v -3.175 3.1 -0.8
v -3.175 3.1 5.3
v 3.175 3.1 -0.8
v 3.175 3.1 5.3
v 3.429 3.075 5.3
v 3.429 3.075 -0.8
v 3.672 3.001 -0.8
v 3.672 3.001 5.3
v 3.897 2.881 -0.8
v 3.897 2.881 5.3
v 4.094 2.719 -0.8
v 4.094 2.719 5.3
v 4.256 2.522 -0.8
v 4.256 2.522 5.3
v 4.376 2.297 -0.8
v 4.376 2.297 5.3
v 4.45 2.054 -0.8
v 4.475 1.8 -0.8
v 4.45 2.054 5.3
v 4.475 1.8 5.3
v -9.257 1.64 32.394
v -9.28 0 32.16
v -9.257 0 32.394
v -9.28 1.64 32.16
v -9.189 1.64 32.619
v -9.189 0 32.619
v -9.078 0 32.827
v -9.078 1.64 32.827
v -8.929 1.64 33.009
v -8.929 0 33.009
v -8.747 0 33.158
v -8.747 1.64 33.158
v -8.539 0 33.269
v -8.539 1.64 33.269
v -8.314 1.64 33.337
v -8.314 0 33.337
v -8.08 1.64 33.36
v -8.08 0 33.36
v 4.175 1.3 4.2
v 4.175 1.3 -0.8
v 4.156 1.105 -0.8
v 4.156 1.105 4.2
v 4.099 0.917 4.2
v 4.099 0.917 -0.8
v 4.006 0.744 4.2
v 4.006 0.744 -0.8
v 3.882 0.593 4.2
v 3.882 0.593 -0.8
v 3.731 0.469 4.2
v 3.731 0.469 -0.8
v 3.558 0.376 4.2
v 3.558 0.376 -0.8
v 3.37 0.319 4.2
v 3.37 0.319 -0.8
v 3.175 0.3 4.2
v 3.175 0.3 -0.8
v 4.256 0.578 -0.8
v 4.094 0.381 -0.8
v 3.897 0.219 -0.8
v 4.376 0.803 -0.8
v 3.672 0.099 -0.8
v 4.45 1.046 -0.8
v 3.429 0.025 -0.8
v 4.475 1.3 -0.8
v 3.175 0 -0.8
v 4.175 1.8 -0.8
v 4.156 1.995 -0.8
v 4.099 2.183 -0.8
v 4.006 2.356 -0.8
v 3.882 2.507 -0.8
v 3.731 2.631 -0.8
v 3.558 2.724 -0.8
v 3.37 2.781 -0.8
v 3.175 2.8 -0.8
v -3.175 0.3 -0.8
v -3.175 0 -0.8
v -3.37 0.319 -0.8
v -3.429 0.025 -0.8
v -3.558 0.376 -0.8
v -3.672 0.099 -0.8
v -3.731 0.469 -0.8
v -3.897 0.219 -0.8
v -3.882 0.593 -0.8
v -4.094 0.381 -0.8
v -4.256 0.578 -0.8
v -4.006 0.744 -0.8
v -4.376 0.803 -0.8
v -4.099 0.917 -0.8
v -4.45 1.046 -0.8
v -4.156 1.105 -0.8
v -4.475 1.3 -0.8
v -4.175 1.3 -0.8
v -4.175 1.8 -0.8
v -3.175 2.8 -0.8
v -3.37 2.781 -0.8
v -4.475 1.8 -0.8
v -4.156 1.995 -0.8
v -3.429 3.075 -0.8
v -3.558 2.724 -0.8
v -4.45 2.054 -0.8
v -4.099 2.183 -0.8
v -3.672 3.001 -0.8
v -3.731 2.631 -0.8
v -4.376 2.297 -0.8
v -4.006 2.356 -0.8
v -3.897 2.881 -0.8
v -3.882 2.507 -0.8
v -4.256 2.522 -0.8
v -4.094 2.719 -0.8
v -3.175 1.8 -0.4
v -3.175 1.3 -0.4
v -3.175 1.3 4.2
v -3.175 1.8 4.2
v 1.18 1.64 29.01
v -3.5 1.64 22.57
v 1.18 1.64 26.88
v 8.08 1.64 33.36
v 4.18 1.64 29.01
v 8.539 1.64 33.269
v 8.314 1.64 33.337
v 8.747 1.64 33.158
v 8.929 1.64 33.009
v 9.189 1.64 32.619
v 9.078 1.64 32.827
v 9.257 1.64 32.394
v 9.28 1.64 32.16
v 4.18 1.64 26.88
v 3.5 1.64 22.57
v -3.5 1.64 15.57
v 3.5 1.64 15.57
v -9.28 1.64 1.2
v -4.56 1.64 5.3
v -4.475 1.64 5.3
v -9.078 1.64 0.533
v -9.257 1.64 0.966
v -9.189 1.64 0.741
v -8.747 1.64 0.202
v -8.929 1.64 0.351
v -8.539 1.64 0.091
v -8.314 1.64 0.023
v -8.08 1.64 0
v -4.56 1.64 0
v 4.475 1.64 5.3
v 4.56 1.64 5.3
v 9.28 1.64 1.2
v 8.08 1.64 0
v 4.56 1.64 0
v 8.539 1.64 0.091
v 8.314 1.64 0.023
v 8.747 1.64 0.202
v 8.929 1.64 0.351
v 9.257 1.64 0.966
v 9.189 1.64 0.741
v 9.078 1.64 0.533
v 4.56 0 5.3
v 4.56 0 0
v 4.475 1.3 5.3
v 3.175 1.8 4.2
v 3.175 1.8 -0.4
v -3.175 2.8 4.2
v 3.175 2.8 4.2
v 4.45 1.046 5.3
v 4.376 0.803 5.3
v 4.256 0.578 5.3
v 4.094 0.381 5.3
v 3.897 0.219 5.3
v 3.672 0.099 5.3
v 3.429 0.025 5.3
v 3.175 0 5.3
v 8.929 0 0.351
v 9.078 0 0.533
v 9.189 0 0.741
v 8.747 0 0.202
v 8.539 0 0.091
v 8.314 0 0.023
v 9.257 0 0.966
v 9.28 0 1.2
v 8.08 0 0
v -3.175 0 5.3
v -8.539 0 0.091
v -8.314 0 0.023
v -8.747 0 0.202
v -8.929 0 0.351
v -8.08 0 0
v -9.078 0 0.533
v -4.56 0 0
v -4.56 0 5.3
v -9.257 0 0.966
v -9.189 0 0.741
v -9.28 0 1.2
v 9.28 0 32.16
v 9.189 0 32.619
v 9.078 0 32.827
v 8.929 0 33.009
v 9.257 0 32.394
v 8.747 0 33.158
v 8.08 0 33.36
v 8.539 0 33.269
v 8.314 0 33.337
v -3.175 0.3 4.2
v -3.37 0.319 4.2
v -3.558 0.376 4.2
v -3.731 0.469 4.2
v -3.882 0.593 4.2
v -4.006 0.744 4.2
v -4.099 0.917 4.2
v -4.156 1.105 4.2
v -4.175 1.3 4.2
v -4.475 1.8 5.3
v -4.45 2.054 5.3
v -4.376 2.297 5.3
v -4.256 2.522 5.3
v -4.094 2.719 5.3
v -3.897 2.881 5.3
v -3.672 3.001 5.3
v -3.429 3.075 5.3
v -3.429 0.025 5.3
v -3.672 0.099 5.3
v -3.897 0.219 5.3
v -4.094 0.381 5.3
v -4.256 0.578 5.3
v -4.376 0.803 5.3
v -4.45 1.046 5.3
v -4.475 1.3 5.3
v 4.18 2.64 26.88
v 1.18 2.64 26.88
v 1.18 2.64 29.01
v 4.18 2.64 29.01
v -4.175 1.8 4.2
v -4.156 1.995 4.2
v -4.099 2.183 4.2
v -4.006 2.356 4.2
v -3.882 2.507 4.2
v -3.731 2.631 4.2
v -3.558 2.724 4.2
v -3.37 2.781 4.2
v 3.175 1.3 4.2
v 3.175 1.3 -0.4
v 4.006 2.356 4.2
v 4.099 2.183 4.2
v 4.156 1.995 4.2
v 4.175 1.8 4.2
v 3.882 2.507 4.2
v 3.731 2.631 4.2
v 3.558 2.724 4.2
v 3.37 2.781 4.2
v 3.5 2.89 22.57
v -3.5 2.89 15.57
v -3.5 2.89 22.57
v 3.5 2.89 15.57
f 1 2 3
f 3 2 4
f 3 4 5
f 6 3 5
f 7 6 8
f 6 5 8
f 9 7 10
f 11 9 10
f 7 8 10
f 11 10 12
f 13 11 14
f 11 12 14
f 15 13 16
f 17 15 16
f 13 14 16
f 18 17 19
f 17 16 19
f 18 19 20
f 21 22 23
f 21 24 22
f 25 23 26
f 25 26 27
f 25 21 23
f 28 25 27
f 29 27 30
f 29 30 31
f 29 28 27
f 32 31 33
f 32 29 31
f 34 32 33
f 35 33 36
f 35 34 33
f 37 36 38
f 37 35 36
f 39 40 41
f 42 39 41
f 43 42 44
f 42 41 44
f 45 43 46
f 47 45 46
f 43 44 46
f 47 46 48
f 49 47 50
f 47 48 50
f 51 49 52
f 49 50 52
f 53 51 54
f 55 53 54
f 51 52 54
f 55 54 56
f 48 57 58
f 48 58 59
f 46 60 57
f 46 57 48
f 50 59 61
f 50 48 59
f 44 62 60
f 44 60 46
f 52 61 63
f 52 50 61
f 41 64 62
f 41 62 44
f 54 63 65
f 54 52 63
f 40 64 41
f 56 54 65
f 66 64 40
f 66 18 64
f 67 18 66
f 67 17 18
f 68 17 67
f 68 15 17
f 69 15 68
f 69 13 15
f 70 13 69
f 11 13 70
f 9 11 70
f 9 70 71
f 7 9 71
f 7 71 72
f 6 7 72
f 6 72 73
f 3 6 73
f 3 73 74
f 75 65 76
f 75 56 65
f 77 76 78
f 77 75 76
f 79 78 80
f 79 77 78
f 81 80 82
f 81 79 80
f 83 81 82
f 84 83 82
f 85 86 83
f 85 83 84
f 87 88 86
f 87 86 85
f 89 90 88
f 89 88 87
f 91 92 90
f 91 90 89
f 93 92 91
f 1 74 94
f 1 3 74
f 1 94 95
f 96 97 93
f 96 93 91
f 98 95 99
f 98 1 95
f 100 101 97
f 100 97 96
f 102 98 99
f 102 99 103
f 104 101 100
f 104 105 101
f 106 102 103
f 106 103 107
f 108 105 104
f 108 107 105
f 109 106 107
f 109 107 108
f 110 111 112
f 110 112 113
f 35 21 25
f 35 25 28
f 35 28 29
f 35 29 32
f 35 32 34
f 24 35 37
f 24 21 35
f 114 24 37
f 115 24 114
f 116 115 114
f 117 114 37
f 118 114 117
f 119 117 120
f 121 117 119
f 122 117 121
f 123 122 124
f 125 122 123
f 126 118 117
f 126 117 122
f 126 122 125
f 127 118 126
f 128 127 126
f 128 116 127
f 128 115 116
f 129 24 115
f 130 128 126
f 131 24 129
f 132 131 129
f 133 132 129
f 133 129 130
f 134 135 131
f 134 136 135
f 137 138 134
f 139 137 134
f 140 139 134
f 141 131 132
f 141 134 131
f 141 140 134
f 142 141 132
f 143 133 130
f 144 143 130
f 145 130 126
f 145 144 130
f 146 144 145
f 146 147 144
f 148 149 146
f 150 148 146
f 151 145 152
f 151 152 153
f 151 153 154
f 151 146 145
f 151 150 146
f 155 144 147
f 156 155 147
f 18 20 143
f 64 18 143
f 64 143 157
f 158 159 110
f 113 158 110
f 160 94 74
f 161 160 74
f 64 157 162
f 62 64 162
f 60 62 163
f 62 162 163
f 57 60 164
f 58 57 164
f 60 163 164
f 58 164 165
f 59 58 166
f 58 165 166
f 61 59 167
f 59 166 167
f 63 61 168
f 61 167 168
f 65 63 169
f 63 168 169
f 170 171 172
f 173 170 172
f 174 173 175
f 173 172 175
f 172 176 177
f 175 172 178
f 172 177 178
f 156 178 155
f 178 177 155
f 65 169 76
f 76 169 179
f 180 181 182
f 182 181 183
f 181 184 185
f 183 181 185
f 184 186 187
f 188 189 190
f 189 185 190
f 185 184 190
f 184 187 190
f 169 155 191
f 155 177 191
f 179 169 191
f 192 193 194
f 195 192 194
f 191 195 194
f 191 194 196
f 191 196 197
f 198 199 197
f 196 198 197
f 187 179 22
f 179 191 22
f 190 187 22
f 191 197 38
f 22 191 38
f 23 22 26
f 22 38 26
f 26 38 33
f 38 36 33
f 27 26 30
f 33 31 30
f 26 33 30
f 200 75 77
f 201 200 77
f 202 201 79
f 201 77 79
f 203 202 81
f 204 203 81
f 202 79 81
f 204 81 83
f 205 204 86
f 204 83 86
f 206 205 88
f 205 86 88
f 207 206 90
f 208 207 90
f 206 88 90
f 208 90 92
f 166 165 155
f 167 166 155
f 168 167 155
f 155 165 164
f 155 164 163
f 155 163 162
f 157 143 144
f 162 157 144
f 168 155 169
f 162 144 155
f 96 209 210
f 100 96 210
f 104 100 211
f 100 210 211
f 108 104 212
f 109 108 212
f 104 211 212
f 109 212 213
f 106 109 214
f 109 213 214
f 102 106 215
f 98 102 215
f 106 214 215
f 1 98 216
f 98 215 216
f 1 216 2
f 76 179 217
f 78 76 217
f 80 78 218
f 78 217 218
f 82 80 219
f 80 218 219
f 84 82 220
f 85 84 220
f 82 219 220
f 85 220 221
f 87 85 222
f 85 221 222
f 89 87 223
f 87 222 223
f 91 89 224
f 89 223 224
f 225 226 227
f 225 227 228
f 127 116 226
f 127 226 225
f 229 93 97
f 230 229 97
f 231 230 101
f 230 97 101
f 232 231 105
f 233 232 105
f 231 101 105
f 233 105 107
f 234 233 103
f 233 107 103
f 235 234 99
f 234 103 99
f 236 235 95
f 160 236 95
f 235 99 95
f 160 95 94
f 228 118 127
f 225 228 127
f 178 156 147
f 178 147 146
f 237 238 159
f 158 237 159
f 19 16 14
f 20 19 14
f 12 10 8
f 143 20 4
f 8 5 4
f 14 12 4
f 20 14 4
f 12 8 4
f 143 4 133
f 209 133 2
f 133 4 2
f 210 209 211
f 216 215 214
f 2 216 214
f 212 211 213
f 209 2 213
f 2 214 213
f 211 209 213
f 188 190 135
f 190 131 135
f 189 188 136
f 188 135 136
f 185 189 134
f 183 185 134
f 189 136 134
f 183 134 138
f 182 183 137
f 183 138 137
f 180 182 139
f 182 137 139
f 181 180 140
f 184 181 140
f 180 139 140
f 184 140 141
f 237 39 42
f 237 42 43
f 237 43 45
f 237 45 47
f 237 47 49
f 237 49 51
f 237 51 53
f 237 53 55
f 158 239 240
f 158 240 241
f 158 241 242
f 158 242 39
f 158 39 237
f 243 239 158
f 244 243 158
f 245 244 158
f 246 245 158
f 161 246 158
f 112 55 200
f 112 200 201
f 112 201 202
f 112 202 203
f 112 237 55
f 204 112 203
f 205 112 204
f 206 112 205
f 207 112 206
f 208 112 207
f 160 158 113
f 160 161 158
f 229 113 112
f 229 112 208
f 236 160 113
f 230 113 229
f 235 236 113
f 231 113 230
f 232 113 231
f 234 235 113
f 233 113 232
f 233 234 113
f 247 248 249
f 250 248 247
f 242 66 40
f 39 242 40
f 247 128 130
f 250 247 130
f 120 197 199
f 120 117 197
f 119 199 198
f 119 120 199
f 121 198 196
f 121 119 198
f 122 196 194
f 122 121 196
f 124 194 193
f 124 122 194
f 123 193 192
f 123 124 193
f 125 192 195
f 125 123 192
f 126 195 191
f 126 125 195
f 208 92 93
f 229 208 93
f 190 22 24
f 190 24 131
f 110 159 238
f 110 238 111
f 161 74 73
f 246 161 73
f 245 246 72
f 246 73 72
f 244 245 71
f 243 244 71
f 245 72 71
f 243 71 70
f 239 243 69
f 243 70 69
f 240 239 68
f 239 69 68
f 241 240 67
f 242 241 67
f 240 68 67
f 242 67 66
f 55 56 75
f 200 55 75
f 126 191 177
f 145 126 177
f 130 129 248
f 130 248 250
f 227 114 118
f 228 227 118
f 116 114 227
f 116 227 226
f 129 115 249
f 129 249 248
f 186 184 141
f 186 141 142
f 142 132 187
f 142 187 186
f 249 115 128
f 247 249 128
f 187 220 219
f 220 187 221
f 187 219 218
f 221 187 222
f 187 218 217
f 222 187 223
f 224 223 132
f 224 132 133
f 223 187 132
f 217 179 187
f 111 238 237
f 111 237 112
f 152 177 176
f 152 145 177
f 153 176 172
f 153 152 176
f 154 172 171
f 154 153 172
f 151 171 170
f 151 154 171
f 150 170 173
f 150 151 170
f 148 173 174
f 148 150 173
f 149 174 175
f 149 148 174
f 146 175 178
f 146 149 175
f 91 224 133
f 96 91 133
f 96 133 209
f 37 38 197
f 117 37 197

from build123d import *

# Parameters (mm, degrees)
SKETCH1_W           = 18.56
SKETCH1_H           = 33.36
BOSS_EXTRUDE1_DEPTH = 1.64
FILLET1_R           = 1.2
SKETCH2_W           = 9.12
SKETCH2_H           = 5.3
CUT_EXTRUDE1_DEPTH  = 35.665510237
BOSS_EXTRUDE2_DEPTH = 6.1
SKETCH4_W           = 6.35
SKETCH4_H           = 0.5
CUT_EXTRUDE2_DEPTH  = 5
SKETCH5_W           = 6.35
SKETCH5_H           = 0.5
CUT_EXTRUDE3_DEPTH  = 0.4
SKETCH7_W           = 7
SKETCH7_H           = 7
BOSS_EXTRUDE3_DEPTH = 1.25
SKETCH8_W           = 3
SKETCH8_H           = 2.13
BOSS_EXTRUDE4_DEPTH = 1


with BuildPart() as part:
    # Sketch1 → Boss-Extrude1 (new body)
    with BuildSketch(Plane(origin=(0, 0, 0), x_dir=(1, 0, 0), z_dir=(0, 1, 0))):
        with Locations((0, -16.68)):
            Rectangle(SKETCH1_W, SKETCH1_H)
    extrude(amount=BOSS_EXTRUDE1_DEPTH)

    # Fillet1
    fillet1_edges = [part.edges().sort_by_distance(p)[0] for p in [
        (-9.28, 0.82, 0),
        (9.28, 0.82, 0),
        (9.28, 0.82, 33.36),
        (-9.28, 0.82, 33.36),
    ]]
    fillet(fillet1_edges, radius=FILLET1_R)

    # Sketch2 → Cut-Extrude1 (cut, through all)
    with BuildSketch(Plane(origin=(0, 1.64, 0), x_dir=(1, 0, 0), z_dir=(0, 1, 0))):
        with Locations((0, -2.65)):
            Rectangle(SKETCH2_W, SKETCH2_H)
    extrude(amount=-CUT_EXTRUDE1_DEPTH, mode=Mode.SUBTRACT)

    # Sketch3 → Boss-Extrude2 (add)
    with BuildSketch(Plane(origin=(0, 0, 5.3), x_dir=(-1, 0, 0), z_dir=(0, 0, -1))):
        with BuildLine():
            Line((-3.175, 0), (3.175, 0))
            ThreePointArc((3.175, 0), (4.094238816, 0.380761184), (4.475, 1.3))
            Line((4.475, 1.3), (4.475, 1.8))
            ThreePointArc((4.475, 1.8), (4.094238816, 2.719238816), (3.175, 3.1))
            Line((3.175, 3.1), (-3.175, 3.1))
            ThreePointArc((-3.175, 3.1), (-4.094238816, 2.719238816), (-4.475, 1.8))
            Line((-4.475, 1.8), (-4.475, 1.3))
            ThreePointArc((-4.475, 1.3), (-4.094238816, 0.380761184), (-3.175, 0))
        make_face()
    extrude(amount=BOSS_EXTRUDE2_DEPTH)

    # Sketch4 → Cut-Extrude2 (cut)
    with BuildSketch(Plane(origin=(0, 0, -0.8), x_dir=(-1, 0, 0), z_dir=(0, 0, -1))):
        with BuildLine():
            Line((3.175, 2.8), (-3.175, 2.8))
            ThreePointArc((-3.175, 2.8), (-3.882106781, 2.507106781), (-4.175, 1.8))
            Line((-4.175, 1.8), (-4.175, 1.3))
            ThreePointArc((-4.175, 1.3), (-3.882106781, 0.592893219), (-3.175, 0.3))
            Line((-3.175, 0.3), (3.175, 0.3))
            ThreePointArc((3.175, 0.3), (3.882106781, 0.592893219), (4.175, 1.3))
            Line((4.175, 1.3), (4.175, 1.8))
            ThreePointArc((4.175, 1.8), (3.882106781, 2.507106781), (3.175, 2.8))
        make_face()
        with Locations((0, 1.55)):
            Rectangle(SKETCH4_W, SKETCH4_H, mode=Mode.SUBTRACT)
    extrude(amount=-CUT_EXTRUDE2_DEPTH, mode=Mode.SUBTRACT)

    # Sketch5 → Cut-Extrude3 (cut)
    with BuildSketch(Plane(origin=(0, 0, -0.8), x_dir=(-1, 0, 0), z_dir=(0, 0, -1))):
        with Locations((0, 1.55)):
            Rectangle(SKETCH5_W, SKETCH5_H)
    extrude(amount=-CUT_EXTRUDE3_DEPTH, mode=Mode.SUBTRACT)

    # Sketch7 → Boss-Extrude3 (add)
    with BuildSketch(Plane(origin=(0, 1.64, 0), x_dir=(1, 0, 0), z_dir=(0, 1, 0))):
        with Locations((0, -19.07)):
            Rectangle(SKETCH7_W, SKETCH7_H)
    extrude(amount=BOSS_EXTRUDE3_DEPTH)

    # Sketch8 → Boss-Extrude4 (add)
    with BuildSketch(Plane(origin=(0, 1.64, 0), x_dir=(1, 0, 0), z_dir=(0, 1, 0))):
        with Locations((2.68, -27.945)):
            Rectangle(SKETCH8_W, SKETCH8_H)
    extrude(amount=BOSS_EXTRUDE4_DEPTH)


solid = part.part
